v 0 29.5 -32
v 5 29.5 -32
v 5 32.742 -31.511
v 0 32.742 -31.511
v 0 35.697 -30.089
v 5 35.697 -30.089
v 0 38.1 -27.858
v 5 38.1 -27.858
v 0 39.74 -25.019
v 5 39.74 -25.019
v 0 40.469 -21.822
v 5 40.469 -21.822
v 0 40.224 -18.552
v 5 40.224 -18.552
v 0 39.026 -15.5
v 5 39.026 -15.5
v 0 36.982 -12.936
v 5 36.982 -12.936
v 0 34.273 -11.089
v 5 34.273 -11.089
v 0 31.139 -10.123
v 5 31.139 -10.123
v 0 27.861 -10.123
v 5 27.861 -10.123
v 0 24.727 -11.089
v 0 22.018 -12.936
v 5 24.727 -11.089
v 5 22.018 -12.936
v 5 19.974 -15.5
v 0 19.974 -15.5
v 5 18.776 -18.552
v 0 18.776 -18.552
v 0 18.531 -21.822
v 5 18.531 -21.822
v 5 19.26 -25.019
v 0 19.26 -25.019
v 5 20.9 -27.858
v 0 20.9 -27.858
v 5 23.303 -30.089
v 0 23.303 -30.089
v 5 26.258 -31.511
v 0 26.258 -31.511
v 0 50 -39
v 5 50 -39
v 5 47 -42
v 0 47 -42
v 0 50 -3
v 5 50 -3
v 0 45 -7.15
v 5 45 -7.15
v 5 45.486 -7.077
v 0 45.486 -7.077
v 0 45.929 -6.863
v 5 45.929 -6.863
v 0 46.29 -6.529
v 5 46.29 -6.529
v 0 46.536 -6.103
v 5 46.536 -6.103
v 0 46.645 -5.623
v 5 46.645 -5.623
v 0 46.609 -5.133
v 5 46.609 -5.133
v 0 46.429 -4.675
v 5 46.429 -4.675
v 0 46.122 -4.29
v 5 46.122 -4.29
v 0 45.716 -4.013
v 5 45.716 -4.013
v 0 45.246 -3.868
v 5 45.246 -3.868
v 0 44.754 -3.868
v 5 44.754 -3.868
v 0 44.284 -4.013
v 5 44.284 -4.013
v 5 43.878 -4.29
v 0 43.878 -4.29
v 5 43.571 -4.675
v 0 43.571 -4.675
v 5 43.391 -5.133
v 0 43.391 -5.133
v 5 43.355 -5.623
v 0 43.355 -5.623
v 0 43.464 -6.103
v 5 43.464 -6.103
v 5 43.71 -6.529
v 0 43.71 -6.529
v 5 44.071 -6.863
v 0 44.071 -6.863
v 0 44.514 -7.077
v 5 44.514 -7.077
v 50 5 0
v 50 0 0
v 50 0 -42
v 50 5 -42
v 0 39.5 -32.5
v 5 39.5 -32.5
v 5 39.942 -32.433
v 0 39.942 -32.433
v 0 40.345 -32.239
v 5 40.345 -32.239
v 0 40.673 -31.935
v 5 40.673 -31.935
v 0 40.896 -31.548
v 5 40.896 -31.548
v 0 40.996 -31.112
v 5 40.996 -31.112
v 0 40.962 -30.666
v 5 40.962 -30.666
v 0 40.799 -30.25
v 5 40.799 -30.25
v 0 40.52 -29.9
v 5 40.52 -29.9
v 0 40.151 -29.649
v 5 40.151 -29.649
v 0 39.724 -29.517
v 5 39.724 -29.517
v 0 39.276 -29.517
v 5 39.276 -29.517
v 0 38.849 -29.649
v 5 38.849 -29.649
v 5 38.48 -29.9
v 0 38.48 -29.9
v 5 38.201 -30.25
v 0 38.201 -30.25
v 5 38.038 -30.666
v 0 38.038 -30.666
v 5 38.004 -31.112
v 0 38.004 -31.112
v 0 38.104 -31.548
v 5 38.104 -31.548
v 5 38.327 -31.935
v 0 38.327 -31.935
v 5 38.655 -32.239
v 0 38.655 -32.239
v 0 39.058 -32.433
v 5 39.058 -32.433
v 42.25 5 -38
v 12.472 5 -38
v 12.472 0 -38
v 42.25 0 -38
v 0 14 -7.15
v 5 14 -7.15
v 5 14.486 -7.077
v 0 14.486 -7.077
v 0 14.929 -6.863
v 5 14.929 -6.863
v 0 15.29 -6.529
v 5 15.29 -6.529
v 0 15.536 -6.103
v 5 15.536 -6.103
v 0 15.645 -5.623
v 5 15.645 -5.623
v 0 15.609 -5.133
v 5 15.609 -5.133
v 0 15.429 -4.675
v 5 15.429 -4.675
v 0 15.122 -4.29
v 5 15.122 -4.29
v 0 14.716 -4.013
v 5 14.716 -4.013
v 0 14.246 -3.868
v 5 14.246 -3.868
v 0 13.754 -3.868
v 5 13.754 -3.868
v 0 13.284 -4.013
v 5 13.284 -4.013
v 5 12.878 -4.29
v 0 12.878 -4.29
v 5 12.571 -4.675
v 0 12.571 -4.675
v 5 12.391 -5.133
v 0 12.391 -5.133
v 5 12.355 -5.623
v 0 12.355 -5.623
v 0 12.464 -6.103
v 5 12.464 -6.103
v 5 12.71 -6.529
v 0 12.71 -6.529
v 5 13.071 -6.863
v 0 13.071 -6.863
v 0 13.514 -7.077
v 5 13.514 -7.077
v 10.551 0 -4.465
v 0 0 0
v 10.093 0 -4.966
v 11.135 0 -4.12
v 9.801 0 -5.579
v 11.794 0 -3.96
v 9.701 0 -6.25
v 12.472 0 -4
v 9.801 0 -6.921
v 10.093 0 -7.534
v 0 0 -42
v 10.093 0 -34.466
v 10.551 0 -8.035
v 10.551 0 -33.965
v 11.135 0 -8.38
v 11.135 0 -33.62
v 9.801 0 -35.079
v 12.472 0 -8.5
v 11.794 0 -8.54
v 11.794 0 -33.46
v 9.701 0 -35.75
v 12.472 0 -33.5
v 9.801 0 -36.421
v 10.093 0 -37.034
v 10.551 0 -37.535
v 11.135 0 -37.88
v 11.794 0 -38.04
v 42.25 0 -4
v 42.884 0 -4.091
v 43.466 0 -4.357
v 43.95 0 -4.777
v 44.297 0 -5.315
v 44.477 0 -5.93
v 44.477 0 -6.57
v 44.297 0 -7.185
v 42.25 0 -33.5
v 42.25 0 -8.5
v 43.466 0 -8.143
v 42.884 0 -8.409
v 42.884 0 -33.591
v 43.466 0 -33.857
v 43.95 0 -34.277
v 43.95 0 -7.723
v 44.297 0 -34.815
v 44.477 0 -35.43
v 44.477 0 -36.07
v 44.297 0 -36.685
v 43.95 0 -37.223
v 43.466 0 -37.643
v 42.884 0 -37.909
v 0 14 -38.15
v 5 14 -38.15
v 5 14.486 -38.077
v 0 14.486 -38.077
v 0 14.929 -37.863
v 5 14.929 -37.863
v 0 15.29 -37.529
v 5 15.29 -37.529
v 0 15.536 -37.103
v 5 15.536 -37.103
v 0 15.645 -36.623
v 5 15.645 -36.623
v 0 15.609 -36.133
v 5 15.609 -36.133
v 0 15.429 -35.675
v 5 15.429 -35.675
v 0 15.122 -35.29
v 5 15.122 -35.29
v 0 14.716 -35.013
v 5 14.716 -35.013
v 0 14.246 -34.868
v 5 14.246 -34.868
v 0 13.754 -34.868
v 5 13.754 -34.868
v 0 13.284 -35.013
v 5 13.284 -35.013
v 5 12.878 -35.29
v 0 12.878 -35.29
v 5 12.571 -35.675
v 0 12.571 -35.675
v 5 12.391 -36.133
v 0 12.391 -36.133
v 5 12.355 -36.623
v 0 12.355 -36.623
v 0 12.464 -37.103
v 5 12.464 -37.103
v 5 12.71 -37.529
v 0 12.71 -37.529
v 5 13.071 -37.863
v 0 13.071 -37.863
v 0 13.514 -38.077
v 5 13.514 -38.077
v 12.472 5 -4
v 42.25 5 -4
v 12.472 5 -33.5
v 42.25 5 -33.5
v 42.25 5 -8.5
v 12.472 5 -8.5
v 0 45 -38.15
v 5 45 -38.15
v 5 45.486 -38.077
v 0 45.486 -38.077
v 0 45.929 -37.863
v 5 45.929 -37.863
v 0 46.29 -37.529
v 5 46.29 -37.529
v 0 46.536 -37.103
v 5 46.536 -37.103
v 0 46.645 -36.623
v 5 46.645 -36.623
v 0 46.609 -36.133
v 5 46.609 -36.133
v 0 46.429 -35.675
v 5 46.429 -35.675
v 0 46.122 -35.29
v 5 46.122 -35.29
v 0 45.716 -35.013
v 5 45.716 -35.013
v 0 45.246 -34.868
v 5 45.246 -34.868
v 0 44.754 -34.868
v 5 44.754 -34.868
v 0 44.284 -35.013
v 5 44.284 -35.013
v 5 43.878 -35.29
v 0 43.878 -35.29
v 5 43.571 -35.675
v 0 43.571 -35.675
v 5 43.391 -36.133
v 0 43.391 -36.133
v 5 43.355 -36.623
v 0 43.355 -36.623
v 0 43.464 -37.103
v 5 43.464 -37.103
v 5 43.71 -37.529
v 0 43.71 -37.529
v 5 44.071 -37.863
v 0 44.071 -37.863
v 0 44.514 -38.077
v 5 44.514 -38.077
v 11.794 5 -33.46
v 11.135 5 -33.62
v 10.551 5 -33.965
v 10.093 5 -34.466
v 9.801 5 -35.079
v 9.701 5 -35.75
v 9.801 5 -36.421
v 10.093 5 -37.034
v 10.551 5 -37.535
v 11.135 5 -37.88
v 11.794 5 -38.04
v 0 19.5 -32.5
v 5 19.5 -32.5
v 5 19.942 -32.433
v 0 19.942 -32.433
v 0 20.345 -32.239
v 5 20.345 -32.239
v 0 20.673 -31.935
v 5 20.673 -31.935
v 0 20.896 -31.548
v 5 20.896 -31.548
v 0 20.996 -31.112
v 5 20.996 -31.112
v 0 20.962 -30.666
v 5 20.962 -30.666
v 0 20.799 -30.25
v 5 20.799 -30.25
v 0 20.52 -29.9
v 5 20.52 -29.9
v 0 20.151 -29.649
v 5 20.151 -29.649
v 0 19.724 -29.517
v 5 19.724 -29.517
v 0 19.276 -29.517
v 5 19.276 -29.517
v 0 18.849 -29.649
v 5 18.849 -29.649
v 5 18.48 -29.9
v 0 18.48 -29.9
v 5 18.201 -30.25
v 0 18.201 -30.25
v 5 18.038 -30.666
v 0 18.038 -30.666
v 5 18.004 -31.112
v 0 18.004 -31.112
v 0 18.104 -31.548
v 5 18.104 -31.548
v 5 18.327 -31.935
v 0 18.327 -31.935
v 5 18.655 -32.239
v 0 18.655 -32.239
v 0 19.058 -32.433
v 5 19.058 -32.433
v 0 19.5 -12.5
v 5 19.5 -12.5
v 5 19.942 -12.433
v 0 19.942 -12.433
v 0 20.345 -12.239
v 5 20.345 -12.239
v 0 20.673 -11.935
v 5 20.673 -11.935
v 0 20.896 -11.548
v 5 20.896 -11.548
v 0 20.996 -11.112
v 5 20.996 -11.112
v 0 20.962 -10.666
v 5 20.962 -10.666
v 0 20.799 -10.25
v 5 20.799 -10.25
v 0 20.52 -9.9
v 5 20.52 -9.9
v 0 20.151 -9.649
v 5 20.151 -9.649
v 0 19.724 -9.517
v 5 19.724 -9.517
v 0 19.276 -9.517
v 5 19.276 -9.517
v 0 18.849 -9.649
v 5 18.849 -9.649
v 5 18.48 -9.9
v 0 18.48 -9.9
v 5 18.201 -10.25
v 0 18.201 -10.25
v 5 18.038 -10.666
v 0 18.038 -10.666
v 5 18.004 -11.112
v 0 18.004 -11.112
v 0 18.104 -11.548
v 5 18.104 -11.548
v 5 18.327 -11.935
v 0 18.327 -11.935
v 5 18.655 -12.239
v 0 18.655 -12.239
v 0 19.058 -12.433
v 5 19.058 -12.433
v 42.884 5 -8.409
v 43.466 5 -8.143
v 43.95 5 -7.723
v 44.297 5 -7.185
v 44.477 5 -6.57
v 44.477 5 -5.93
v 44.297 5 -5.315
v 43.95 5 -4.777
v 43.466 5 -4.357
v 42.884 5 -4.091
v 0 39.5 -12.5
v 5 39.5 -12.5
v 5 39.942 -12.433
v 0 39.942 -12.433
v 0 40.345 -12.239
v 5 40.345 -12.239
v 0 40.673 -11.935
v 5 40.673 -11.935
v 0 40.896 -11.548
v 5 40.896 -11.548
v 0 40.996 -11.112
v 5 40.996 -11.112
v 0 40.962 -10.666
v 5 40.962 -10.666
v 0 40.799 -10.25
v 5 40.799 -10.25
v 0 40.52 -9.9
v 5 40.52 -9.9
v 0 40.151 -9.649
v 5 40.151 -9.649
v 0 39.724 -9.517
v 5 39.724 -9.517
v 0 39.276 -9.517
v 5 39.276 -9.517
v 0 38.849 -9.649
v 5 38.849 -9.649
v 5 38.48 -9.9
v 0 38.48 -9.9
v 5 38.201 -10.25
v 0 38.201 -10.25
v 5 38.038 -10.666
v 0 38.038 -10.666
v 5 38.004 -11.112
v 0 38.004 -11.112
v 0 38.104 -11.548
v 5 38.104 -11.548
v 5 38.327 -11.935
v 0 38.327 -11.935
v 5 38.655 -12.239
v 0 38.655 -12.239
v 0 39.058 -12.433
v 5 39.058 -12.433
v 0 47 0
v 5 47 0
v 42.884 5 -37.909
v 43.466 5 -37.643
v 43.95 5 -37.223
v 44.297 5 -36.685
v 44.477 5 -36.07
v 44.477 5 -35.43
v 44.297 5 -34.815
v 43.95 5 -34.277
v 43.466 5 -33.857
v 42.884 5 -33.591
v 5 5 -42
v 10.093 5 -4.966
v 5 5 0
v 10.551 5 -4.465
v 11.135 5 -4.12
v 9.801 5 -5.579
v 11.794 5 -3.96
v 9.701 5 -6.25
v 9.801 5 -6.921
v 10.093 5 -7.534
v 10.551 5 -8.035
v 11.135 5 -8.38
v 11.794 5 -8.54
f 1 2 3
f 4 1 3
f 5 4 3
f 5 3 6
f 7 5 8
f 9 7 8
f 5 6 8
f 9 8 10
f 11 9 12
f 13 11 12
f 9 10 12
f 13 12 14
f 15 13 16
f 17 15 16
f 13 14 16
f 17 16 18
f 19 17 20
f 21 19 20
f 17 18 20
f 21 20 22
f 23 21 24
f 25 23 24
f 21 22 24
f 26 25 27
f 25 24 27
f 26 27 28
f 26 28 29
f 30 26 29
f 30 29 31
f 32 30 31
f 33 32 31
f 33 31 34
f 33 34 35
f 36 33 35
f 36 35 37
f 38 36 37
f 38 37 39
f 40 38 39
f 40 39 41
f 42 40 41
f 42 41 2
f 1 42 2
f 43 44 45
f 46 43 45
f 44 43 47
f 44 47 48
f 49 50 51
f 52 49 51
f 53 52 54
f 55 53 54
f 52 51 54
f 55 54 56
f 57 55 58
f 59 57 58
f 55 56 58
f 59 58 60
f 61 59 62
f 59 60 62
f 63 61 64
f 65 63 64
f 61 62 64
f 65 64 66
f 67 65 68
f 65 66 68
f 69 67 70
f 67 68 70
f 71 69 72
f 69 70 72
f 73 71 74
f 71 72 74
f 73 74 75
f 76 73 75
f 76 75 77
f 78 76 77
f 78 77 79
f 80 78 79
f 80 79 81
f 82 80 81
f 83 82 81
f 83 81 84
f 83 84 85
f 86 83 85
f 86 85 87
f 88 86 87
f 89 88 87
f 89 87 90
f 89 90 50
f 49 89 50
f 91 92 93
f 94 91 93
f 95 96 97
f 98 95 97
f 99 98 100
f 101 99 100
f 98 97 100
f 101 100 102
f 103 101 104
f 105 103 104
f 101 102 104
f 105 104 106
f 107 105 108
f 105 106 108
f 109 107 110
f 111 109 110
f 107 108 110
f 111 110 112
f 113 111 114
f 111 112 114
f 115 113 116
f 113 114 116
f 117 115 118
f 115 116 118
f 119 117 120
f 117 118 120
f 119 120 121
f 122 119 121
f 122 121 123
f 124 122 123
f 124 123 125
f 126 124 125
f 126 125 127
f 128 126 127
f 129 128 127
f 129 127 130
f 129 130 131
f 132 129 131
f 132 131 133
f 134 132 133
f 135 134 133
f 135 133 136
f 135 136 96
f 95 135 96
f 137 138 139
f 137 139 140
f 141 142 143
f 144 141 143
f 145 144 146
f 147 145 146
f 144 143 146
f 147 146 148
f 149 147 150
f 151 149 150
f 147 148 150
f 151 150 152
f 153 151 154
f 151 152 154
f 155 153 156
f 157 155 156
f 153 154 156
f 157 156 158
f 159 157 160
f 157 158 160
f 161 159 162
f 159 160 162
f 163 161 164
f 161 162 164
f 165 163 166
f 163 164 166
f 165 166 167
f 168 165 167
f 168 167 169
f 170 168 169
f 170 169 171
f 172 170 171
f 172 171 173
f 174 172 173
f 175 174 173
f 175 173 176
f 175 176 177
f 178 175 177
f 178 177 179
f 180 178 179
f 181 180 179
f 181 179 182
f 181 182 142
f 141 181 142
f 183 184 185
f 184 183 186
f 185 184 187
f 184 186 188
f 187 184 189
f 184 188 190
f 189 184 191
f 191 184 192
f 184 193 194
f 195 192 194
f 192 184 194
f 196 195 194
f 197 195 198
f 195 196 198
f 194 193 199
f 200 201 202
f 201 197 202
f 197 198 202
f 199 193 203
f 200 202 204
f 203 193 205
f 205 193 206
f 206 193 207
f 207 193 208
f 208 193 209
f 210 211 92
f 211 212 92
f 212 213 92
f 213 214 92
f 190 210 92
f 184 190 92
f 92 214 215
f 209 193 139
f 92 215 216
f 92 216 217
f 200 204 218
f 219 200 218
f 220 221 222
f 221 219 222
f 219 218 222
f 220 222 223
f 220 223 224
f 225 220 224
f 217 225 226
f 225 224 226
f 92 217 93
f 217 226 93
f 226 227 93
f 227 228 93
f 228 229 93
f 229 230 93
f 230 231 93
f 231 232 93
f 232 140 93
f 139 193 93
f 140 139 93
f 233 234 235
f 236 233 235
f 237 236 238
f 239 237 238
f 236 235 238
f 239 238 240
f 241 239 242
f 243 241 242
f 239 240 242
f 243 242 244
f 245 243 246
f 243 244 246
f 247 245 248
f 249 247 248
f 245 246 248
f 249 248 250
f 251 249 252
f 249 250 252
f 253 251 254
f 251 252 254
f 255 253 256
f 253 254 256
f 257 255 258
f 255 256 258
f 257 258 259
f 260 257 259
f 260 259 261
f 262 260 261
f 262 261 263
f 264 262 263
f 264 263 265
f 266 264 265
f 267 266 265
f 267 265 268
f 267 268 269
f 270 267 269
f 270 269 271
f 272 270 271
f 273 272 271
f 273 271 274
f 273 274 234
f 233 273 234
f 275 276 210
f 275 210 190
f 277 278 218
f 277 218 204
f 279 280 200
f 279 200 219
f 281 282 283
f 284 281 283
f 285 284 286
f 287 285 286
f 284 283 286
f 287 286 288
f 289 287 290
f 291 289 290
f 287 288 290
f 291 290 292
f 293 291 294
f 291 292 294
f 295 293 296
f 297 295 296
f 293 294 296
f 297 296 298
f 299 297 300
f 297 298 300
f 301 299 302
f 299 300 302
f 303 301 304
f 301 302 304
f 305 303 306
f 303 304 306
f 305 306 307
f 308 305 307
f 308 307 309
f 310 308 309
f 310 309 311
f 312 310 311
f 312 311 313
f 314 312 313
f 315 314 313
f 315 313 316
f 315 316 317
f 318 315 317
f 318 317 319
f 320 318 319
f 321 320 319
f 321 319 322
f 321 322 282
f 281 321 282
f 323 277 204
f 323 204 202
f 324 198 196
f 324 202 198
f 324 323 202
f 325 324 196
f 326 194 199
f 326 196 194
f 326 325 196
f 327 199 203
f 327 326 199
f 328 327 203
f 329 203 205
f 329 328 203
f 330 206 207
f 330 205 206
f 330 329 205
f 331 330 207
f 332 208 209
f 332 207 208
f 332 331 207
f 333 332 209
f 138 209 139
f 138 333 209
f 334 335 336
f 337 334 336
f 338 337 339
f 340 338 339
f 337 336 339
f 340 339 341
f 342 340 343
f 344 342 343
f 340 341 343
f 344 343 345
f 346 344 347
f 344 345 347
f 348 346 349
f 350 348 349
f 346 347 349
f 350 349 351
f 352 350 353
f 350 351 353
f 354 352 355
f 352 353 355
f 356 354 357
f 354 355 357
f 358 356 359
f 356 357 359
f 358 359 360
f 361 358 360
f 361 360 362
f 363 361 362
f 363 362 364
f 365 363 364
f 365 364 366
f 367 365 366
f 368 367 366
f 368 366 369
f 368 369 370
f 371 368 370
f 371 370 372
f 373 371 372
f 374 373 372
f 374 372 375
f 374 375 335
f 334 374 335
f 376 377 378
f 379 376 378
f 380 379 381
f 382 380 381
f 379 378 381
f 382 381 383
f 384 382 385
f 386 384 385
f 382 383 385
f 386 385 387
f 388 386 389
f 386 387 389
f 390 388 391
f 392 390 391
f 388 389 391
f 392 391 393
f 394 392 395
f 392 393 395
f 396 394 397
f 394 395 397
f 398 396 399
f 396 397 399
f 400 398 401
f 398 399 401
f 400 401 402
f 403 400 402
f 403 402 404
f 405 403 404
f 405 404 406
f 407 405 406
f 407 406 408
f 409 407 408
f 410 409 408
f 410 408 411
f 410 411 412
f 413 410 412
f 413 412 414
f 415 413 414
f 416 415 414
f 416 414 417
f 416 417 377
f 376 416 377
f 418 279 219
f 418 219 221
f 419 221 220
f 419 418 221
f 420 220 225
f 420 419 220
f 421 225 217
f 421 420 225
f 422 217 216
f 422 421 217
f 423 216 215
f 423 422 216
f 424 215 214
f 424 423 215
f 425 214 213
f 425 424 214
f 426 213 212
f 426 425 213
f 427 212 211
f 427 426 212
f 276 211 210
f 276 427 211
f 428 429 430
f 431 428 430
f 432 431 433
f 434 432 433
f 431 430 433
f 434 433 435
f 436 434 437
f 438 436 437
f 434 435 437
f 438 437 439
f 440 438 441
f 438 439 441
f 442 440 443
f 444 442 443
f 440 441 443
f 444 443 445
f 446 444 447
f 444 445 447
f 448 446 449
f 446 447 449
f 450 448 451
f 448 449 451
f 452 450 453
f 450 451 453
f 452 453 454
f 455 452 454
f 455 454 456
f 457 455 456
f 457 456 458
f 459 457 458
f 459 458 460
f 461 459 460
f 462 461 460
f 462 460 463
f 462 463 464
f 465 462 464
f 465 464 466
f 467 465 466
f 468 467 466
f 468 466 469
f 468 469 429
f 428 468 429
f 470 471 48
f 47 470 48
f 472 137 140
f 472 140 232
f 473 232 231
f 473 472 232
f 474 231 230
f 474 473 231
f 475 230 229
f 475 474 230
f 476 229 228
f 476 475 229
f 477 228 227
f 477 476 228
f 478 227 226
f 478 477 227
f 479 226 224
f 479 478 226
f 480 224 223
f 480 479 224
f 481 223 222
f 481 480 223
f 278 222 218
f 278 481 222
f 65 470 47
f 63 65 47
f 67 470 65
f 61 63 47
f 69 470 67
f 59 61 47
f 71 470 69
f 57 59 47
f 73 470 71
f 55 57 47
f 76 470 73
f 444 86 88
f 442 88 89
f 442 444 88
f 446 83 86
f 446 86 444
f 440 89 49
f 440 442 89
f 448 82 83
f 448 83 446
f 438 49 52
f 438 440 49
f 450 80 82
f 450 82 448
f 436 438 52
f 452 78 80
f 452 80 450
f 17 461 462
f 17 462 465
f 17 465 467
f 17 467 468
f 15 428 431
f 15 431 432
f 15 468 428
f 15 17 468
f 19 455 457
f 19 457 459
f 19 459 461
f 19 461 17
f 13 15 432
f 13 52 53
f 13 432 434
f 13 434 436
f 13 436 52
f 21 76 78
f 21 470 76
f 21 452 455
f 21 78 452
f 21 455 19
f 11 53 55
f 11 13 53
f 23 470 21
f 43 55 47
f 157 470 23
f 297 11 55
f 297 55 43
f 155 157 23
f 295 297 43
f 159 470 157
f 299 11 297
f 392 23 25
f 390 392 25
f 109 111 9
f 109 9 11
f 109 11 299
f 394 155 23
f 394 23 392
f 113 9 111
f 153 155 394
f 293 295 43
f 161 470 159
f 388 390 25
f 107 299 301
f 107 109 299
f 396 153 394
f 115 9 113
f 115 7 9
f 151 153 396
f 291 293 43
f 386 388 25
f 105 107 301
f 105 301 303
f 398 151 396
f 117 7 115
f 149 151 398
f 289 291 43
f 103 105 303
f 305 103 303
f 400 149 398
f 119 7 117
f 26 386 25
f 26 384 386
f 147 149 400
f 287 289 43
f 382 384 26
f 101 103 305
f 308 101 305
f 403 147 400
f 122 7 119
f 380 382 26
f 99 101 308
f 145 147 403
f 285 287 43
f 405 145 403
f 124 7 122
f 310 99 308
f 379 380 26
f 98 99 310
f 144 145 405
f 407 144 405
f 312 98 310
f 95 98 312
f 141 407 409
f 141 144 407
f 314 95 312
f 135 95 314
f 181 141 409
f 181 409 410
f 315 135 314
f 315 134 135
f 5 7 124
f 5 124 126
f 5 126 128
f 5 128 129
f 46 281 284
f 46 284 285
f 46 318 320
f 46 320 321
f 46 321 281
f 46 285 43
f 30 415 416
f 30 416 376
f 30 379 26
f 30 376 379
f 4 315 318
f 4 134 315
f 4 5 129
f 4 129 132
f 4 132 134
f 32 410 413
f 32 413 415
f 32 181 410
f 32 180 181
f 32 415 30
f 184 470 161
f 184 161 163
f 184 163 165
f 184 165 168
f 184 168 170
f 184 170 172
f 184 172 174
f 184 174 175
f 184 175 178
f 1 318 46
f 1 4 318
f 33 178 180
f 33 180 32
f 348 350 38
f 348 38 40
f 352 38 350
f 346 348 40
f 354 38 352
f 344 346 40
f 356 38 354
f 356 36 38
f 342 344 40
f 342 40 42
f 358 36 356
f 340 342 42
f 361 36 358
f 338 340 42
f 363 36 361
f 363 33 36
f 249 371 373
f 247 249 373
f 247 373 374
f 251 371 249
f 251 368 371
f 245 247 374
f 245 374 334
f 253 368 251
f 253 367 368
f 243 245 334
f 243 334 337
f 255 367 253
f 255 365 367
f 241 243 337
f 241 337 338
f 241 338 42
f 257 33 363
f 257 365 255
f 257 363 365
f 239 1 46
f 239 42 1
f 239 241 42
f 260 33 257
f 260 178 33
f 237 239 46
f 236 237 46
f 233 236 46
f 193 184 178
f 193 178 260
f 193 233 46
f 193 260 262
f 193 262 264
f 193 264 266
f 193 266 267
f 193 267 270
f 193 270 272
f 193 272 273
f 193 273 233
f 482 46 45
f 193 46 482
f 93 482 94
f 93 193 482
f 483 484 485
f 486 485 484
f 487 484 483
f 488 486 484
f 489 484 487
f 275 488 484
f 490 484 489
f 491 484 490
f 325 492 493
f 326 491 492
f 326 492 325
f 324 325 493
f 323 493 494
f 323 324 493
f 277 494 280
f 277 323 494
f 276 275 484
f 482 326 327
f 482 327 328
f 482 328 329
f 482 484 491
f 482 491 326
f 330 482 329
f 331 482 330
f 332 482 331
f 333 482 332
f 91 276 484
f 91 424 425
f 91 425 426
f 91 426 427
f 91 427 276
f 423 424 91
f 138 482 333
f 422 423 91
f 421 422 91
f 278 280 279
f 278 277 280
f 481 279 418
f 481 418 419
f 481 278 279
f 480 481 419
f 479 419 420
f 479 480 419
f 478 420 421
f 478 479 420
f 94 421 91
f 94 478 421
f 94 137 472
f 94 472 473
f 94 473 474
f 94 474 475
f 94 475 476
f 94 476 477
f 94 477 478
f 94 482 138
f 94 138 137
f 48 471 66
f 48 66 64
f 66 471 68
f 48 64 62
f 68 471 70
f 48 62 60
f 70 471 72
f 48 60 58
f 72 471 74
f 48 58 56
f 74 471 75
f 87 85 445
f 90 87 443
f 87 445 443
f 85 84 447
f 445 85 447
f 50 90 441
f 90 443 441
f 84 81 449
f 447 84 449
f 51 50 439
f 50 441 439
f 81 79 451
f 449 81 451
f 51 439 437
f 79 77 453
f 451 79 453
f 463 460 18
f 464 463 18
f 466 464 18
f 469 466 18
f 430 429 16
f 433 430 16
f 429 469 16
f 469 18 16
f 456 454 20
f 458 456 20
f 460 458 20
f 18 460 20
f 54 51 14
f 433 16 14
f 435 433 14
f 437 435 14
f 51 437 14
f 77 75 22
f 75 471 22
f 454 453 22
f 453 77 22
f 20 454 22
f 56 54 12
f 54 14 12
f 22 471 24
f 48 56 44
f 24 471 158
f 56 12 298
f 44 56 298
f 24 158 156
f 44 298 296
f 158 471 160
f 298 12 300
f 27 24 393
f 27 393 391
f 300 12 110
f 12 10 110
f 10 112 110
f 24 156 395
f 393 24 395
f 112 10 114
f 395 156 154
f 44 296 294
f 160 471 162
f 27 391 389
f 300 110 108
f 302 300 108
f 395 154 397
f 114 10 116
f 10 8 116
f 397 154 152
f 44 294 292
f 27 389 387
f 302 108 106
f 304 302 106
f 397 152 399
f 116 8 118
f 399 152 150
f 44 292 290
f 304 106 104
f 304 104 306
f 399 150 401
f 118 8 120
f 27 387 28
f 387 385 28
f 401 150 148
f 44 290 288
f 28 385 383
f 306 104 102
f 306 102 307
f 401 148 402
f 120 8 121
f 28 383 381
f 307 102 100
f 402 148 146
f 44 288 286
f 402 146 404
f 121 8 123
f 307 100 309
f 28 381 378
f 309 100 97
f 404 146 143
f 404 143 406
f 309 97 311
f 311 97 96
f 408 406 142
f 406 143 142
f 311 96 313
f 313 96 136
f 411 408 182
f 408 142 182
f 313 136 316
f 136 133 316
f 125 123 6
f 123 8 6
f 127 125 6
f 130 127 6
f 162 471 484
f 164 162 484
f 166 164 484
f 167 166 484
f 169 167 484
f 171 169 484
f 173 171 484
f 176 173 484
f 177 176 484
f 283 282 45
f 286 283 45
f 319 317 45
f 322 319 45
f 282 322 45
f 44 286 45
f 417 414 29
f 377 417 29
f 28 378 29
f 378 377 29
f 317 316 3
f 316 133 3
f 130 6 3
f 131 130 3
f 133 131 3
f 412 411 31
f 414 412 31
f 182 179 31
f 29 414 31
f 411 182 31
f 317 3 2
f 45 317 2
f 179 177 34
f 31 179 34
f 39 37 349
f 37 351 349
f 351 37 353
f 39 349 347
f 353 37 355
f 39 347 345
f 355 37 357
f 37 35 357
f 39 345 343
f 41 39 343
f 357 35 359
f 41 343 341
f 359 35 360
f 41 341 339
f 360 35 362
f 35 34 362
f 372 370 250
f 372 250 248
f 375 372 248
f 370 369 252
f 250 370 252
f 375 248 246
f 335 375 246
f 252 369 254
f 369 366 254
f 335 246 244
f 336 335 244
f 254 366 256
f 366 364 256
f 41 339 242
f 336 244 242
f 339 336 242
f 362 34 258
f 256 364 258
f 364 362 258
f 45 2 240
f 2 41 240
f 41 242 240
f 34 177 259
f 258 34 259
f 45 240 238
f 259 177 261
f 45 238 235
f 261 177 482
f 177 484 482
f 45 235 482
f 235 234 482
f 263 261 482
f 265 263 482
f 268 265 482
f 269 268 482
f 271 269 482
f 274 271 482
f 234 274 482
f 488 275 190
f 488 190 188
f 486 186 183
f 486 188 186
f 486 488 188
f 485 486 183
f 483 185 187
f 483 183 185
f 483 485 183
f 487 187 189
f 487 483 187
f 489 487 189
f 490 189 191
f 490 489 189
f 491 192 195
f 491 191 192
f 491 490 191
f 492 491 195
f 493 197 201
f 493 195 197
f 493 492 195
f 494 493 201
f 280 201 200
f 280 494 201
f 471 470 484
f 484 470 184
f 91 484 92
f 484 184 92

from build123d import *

# Parameters (mm, degrees)
SKETCH1_W           = 50
SKETCH1_H           = 42
BOSS_EXTRUDE1_DEPTH = 5
SKETCH2_W           = 5
SKETCH2_H           = 42
BOSS_EXTRUDE2_DEPTH = 45
CUT_EXTRUDE1_DEPTH  = 45
CUT_EXTRUDE3_DEPTH  = 6
SKETCH7_R           = 11
SKETCH7_R_2         = 1.65
SKETCH7_R_3         = 1.5
CUT_EXTRUDE4_DEPTH  = 6


with BuildPart() as part:
    # Sketch1 → Boss-Extrude1 (new body)
    with BuildSketch(Plane(origin=(0, 0, 0), x_dir=(1, 0, 0), z_dir=(0, 1, 0))):
        with Locations((25, 21)):
            Rectangle(SKETCH1_W, SKETCH1_H)
    extrude(amount=BOSS_EXTRUDE1_DEPTH)

    # Sketch2 → Boss-Extrude2 (add)
    with BuildSketch(Plane(origin=(0, 5, 0), x_dir=(1, 0, 0), z_dir=(0, 1, 0))):
        with Locations((2.5, 21)):
            Rectangle(SKETCH2_W, SKETCH2_H)
    extrude(amount=BOSS_EXTRUDE2_DEPTH)

    # Sketch3 → Cut-Extrude1 (cut)
    with BuildSketch(Plane(origin=(5, 0, 0), x_dir=(0, 0, -1), z_dir=(1, 0, 0))):
        Polygon((0, 47), (3, 50), (0, 50), align=None)
        Polygon((42, 50), (39, 50), (42, 47), align=None)
    extrude(amount=-CUT_EXTRUDE1_DEPTH, mode=Mode.SUBTRACT)

    # Sketch4 → Cut-Extrude3 (cut, through all)
    with BuildSketch(Plane(origin=(0, 5, 0), x_dir=(1, 0, 0), z_dir=(0, 1, 0))):
        with BuildLine():
            Line((12.471581484, 8.5), (42.25, 8.5))
            ThreePointArc((42.25, 8.5), (44.5, 6.25), (42.25, 4))
            Line((42.25, 4), (12.471581484, 4))
            ThreePointArc((12.471581484, 4), (9.701111334, 6.25), (12.471581484, 8.5))
        make_face()
        with BuildLine():
            Line((12.471581484, 38), (42.25, 38))
            ThreePointArc((42.25, 38), (44.5, 35.75), (42.25, 33.5))
            Line((42.25, 33.5), (12.471581484, 33.5))
            ThreePointArc((12.471581484, 33.5), (9.701111334, 35.75), (12.471581484, 38))
        make_face()
    extrude(amount=-CUT_EXTRUDE3_DEPTH, mode=Mode.SUBTRACT)

    # Sketch7 → Cut-Extrude4 (cut, through all)
    with BuildSketch(Plane(origin=(5, 0, 0), x_dir=(0, 0, -1), z_dir=(1, 0, 0))):
        with Locations((21, 29.5)):
            Circle(SKETCH7_R)
        with Locations((5.5, 45)):
            Circle(SKETCH7_R_2)
        with Locations((31, 39.5)):
            Circle(SKETCH7_R_3)
        with Locations((5.5, 14)):
            Circle(SKETCH7_R_2)
        with Locations((31, 19.5)):
            Circle(SKETCH7_R_3)
        with Locations((36.5, 14)):
            Circle(SKETCH7_R_2)
        with Locations((11, 19.5)):
            Circle(SKETCH7_R_3)
        with Locations((11, 39.5)):
            Circle(SKETCH7_R_3)
        with Locations((36.5, 45)):
            Circle(SKETCH7_R_2)
    extrude(amount=-CUT_EXTRUDE4_DEPTH, mode=Mode.SUBTRACT)


solid = part.part
